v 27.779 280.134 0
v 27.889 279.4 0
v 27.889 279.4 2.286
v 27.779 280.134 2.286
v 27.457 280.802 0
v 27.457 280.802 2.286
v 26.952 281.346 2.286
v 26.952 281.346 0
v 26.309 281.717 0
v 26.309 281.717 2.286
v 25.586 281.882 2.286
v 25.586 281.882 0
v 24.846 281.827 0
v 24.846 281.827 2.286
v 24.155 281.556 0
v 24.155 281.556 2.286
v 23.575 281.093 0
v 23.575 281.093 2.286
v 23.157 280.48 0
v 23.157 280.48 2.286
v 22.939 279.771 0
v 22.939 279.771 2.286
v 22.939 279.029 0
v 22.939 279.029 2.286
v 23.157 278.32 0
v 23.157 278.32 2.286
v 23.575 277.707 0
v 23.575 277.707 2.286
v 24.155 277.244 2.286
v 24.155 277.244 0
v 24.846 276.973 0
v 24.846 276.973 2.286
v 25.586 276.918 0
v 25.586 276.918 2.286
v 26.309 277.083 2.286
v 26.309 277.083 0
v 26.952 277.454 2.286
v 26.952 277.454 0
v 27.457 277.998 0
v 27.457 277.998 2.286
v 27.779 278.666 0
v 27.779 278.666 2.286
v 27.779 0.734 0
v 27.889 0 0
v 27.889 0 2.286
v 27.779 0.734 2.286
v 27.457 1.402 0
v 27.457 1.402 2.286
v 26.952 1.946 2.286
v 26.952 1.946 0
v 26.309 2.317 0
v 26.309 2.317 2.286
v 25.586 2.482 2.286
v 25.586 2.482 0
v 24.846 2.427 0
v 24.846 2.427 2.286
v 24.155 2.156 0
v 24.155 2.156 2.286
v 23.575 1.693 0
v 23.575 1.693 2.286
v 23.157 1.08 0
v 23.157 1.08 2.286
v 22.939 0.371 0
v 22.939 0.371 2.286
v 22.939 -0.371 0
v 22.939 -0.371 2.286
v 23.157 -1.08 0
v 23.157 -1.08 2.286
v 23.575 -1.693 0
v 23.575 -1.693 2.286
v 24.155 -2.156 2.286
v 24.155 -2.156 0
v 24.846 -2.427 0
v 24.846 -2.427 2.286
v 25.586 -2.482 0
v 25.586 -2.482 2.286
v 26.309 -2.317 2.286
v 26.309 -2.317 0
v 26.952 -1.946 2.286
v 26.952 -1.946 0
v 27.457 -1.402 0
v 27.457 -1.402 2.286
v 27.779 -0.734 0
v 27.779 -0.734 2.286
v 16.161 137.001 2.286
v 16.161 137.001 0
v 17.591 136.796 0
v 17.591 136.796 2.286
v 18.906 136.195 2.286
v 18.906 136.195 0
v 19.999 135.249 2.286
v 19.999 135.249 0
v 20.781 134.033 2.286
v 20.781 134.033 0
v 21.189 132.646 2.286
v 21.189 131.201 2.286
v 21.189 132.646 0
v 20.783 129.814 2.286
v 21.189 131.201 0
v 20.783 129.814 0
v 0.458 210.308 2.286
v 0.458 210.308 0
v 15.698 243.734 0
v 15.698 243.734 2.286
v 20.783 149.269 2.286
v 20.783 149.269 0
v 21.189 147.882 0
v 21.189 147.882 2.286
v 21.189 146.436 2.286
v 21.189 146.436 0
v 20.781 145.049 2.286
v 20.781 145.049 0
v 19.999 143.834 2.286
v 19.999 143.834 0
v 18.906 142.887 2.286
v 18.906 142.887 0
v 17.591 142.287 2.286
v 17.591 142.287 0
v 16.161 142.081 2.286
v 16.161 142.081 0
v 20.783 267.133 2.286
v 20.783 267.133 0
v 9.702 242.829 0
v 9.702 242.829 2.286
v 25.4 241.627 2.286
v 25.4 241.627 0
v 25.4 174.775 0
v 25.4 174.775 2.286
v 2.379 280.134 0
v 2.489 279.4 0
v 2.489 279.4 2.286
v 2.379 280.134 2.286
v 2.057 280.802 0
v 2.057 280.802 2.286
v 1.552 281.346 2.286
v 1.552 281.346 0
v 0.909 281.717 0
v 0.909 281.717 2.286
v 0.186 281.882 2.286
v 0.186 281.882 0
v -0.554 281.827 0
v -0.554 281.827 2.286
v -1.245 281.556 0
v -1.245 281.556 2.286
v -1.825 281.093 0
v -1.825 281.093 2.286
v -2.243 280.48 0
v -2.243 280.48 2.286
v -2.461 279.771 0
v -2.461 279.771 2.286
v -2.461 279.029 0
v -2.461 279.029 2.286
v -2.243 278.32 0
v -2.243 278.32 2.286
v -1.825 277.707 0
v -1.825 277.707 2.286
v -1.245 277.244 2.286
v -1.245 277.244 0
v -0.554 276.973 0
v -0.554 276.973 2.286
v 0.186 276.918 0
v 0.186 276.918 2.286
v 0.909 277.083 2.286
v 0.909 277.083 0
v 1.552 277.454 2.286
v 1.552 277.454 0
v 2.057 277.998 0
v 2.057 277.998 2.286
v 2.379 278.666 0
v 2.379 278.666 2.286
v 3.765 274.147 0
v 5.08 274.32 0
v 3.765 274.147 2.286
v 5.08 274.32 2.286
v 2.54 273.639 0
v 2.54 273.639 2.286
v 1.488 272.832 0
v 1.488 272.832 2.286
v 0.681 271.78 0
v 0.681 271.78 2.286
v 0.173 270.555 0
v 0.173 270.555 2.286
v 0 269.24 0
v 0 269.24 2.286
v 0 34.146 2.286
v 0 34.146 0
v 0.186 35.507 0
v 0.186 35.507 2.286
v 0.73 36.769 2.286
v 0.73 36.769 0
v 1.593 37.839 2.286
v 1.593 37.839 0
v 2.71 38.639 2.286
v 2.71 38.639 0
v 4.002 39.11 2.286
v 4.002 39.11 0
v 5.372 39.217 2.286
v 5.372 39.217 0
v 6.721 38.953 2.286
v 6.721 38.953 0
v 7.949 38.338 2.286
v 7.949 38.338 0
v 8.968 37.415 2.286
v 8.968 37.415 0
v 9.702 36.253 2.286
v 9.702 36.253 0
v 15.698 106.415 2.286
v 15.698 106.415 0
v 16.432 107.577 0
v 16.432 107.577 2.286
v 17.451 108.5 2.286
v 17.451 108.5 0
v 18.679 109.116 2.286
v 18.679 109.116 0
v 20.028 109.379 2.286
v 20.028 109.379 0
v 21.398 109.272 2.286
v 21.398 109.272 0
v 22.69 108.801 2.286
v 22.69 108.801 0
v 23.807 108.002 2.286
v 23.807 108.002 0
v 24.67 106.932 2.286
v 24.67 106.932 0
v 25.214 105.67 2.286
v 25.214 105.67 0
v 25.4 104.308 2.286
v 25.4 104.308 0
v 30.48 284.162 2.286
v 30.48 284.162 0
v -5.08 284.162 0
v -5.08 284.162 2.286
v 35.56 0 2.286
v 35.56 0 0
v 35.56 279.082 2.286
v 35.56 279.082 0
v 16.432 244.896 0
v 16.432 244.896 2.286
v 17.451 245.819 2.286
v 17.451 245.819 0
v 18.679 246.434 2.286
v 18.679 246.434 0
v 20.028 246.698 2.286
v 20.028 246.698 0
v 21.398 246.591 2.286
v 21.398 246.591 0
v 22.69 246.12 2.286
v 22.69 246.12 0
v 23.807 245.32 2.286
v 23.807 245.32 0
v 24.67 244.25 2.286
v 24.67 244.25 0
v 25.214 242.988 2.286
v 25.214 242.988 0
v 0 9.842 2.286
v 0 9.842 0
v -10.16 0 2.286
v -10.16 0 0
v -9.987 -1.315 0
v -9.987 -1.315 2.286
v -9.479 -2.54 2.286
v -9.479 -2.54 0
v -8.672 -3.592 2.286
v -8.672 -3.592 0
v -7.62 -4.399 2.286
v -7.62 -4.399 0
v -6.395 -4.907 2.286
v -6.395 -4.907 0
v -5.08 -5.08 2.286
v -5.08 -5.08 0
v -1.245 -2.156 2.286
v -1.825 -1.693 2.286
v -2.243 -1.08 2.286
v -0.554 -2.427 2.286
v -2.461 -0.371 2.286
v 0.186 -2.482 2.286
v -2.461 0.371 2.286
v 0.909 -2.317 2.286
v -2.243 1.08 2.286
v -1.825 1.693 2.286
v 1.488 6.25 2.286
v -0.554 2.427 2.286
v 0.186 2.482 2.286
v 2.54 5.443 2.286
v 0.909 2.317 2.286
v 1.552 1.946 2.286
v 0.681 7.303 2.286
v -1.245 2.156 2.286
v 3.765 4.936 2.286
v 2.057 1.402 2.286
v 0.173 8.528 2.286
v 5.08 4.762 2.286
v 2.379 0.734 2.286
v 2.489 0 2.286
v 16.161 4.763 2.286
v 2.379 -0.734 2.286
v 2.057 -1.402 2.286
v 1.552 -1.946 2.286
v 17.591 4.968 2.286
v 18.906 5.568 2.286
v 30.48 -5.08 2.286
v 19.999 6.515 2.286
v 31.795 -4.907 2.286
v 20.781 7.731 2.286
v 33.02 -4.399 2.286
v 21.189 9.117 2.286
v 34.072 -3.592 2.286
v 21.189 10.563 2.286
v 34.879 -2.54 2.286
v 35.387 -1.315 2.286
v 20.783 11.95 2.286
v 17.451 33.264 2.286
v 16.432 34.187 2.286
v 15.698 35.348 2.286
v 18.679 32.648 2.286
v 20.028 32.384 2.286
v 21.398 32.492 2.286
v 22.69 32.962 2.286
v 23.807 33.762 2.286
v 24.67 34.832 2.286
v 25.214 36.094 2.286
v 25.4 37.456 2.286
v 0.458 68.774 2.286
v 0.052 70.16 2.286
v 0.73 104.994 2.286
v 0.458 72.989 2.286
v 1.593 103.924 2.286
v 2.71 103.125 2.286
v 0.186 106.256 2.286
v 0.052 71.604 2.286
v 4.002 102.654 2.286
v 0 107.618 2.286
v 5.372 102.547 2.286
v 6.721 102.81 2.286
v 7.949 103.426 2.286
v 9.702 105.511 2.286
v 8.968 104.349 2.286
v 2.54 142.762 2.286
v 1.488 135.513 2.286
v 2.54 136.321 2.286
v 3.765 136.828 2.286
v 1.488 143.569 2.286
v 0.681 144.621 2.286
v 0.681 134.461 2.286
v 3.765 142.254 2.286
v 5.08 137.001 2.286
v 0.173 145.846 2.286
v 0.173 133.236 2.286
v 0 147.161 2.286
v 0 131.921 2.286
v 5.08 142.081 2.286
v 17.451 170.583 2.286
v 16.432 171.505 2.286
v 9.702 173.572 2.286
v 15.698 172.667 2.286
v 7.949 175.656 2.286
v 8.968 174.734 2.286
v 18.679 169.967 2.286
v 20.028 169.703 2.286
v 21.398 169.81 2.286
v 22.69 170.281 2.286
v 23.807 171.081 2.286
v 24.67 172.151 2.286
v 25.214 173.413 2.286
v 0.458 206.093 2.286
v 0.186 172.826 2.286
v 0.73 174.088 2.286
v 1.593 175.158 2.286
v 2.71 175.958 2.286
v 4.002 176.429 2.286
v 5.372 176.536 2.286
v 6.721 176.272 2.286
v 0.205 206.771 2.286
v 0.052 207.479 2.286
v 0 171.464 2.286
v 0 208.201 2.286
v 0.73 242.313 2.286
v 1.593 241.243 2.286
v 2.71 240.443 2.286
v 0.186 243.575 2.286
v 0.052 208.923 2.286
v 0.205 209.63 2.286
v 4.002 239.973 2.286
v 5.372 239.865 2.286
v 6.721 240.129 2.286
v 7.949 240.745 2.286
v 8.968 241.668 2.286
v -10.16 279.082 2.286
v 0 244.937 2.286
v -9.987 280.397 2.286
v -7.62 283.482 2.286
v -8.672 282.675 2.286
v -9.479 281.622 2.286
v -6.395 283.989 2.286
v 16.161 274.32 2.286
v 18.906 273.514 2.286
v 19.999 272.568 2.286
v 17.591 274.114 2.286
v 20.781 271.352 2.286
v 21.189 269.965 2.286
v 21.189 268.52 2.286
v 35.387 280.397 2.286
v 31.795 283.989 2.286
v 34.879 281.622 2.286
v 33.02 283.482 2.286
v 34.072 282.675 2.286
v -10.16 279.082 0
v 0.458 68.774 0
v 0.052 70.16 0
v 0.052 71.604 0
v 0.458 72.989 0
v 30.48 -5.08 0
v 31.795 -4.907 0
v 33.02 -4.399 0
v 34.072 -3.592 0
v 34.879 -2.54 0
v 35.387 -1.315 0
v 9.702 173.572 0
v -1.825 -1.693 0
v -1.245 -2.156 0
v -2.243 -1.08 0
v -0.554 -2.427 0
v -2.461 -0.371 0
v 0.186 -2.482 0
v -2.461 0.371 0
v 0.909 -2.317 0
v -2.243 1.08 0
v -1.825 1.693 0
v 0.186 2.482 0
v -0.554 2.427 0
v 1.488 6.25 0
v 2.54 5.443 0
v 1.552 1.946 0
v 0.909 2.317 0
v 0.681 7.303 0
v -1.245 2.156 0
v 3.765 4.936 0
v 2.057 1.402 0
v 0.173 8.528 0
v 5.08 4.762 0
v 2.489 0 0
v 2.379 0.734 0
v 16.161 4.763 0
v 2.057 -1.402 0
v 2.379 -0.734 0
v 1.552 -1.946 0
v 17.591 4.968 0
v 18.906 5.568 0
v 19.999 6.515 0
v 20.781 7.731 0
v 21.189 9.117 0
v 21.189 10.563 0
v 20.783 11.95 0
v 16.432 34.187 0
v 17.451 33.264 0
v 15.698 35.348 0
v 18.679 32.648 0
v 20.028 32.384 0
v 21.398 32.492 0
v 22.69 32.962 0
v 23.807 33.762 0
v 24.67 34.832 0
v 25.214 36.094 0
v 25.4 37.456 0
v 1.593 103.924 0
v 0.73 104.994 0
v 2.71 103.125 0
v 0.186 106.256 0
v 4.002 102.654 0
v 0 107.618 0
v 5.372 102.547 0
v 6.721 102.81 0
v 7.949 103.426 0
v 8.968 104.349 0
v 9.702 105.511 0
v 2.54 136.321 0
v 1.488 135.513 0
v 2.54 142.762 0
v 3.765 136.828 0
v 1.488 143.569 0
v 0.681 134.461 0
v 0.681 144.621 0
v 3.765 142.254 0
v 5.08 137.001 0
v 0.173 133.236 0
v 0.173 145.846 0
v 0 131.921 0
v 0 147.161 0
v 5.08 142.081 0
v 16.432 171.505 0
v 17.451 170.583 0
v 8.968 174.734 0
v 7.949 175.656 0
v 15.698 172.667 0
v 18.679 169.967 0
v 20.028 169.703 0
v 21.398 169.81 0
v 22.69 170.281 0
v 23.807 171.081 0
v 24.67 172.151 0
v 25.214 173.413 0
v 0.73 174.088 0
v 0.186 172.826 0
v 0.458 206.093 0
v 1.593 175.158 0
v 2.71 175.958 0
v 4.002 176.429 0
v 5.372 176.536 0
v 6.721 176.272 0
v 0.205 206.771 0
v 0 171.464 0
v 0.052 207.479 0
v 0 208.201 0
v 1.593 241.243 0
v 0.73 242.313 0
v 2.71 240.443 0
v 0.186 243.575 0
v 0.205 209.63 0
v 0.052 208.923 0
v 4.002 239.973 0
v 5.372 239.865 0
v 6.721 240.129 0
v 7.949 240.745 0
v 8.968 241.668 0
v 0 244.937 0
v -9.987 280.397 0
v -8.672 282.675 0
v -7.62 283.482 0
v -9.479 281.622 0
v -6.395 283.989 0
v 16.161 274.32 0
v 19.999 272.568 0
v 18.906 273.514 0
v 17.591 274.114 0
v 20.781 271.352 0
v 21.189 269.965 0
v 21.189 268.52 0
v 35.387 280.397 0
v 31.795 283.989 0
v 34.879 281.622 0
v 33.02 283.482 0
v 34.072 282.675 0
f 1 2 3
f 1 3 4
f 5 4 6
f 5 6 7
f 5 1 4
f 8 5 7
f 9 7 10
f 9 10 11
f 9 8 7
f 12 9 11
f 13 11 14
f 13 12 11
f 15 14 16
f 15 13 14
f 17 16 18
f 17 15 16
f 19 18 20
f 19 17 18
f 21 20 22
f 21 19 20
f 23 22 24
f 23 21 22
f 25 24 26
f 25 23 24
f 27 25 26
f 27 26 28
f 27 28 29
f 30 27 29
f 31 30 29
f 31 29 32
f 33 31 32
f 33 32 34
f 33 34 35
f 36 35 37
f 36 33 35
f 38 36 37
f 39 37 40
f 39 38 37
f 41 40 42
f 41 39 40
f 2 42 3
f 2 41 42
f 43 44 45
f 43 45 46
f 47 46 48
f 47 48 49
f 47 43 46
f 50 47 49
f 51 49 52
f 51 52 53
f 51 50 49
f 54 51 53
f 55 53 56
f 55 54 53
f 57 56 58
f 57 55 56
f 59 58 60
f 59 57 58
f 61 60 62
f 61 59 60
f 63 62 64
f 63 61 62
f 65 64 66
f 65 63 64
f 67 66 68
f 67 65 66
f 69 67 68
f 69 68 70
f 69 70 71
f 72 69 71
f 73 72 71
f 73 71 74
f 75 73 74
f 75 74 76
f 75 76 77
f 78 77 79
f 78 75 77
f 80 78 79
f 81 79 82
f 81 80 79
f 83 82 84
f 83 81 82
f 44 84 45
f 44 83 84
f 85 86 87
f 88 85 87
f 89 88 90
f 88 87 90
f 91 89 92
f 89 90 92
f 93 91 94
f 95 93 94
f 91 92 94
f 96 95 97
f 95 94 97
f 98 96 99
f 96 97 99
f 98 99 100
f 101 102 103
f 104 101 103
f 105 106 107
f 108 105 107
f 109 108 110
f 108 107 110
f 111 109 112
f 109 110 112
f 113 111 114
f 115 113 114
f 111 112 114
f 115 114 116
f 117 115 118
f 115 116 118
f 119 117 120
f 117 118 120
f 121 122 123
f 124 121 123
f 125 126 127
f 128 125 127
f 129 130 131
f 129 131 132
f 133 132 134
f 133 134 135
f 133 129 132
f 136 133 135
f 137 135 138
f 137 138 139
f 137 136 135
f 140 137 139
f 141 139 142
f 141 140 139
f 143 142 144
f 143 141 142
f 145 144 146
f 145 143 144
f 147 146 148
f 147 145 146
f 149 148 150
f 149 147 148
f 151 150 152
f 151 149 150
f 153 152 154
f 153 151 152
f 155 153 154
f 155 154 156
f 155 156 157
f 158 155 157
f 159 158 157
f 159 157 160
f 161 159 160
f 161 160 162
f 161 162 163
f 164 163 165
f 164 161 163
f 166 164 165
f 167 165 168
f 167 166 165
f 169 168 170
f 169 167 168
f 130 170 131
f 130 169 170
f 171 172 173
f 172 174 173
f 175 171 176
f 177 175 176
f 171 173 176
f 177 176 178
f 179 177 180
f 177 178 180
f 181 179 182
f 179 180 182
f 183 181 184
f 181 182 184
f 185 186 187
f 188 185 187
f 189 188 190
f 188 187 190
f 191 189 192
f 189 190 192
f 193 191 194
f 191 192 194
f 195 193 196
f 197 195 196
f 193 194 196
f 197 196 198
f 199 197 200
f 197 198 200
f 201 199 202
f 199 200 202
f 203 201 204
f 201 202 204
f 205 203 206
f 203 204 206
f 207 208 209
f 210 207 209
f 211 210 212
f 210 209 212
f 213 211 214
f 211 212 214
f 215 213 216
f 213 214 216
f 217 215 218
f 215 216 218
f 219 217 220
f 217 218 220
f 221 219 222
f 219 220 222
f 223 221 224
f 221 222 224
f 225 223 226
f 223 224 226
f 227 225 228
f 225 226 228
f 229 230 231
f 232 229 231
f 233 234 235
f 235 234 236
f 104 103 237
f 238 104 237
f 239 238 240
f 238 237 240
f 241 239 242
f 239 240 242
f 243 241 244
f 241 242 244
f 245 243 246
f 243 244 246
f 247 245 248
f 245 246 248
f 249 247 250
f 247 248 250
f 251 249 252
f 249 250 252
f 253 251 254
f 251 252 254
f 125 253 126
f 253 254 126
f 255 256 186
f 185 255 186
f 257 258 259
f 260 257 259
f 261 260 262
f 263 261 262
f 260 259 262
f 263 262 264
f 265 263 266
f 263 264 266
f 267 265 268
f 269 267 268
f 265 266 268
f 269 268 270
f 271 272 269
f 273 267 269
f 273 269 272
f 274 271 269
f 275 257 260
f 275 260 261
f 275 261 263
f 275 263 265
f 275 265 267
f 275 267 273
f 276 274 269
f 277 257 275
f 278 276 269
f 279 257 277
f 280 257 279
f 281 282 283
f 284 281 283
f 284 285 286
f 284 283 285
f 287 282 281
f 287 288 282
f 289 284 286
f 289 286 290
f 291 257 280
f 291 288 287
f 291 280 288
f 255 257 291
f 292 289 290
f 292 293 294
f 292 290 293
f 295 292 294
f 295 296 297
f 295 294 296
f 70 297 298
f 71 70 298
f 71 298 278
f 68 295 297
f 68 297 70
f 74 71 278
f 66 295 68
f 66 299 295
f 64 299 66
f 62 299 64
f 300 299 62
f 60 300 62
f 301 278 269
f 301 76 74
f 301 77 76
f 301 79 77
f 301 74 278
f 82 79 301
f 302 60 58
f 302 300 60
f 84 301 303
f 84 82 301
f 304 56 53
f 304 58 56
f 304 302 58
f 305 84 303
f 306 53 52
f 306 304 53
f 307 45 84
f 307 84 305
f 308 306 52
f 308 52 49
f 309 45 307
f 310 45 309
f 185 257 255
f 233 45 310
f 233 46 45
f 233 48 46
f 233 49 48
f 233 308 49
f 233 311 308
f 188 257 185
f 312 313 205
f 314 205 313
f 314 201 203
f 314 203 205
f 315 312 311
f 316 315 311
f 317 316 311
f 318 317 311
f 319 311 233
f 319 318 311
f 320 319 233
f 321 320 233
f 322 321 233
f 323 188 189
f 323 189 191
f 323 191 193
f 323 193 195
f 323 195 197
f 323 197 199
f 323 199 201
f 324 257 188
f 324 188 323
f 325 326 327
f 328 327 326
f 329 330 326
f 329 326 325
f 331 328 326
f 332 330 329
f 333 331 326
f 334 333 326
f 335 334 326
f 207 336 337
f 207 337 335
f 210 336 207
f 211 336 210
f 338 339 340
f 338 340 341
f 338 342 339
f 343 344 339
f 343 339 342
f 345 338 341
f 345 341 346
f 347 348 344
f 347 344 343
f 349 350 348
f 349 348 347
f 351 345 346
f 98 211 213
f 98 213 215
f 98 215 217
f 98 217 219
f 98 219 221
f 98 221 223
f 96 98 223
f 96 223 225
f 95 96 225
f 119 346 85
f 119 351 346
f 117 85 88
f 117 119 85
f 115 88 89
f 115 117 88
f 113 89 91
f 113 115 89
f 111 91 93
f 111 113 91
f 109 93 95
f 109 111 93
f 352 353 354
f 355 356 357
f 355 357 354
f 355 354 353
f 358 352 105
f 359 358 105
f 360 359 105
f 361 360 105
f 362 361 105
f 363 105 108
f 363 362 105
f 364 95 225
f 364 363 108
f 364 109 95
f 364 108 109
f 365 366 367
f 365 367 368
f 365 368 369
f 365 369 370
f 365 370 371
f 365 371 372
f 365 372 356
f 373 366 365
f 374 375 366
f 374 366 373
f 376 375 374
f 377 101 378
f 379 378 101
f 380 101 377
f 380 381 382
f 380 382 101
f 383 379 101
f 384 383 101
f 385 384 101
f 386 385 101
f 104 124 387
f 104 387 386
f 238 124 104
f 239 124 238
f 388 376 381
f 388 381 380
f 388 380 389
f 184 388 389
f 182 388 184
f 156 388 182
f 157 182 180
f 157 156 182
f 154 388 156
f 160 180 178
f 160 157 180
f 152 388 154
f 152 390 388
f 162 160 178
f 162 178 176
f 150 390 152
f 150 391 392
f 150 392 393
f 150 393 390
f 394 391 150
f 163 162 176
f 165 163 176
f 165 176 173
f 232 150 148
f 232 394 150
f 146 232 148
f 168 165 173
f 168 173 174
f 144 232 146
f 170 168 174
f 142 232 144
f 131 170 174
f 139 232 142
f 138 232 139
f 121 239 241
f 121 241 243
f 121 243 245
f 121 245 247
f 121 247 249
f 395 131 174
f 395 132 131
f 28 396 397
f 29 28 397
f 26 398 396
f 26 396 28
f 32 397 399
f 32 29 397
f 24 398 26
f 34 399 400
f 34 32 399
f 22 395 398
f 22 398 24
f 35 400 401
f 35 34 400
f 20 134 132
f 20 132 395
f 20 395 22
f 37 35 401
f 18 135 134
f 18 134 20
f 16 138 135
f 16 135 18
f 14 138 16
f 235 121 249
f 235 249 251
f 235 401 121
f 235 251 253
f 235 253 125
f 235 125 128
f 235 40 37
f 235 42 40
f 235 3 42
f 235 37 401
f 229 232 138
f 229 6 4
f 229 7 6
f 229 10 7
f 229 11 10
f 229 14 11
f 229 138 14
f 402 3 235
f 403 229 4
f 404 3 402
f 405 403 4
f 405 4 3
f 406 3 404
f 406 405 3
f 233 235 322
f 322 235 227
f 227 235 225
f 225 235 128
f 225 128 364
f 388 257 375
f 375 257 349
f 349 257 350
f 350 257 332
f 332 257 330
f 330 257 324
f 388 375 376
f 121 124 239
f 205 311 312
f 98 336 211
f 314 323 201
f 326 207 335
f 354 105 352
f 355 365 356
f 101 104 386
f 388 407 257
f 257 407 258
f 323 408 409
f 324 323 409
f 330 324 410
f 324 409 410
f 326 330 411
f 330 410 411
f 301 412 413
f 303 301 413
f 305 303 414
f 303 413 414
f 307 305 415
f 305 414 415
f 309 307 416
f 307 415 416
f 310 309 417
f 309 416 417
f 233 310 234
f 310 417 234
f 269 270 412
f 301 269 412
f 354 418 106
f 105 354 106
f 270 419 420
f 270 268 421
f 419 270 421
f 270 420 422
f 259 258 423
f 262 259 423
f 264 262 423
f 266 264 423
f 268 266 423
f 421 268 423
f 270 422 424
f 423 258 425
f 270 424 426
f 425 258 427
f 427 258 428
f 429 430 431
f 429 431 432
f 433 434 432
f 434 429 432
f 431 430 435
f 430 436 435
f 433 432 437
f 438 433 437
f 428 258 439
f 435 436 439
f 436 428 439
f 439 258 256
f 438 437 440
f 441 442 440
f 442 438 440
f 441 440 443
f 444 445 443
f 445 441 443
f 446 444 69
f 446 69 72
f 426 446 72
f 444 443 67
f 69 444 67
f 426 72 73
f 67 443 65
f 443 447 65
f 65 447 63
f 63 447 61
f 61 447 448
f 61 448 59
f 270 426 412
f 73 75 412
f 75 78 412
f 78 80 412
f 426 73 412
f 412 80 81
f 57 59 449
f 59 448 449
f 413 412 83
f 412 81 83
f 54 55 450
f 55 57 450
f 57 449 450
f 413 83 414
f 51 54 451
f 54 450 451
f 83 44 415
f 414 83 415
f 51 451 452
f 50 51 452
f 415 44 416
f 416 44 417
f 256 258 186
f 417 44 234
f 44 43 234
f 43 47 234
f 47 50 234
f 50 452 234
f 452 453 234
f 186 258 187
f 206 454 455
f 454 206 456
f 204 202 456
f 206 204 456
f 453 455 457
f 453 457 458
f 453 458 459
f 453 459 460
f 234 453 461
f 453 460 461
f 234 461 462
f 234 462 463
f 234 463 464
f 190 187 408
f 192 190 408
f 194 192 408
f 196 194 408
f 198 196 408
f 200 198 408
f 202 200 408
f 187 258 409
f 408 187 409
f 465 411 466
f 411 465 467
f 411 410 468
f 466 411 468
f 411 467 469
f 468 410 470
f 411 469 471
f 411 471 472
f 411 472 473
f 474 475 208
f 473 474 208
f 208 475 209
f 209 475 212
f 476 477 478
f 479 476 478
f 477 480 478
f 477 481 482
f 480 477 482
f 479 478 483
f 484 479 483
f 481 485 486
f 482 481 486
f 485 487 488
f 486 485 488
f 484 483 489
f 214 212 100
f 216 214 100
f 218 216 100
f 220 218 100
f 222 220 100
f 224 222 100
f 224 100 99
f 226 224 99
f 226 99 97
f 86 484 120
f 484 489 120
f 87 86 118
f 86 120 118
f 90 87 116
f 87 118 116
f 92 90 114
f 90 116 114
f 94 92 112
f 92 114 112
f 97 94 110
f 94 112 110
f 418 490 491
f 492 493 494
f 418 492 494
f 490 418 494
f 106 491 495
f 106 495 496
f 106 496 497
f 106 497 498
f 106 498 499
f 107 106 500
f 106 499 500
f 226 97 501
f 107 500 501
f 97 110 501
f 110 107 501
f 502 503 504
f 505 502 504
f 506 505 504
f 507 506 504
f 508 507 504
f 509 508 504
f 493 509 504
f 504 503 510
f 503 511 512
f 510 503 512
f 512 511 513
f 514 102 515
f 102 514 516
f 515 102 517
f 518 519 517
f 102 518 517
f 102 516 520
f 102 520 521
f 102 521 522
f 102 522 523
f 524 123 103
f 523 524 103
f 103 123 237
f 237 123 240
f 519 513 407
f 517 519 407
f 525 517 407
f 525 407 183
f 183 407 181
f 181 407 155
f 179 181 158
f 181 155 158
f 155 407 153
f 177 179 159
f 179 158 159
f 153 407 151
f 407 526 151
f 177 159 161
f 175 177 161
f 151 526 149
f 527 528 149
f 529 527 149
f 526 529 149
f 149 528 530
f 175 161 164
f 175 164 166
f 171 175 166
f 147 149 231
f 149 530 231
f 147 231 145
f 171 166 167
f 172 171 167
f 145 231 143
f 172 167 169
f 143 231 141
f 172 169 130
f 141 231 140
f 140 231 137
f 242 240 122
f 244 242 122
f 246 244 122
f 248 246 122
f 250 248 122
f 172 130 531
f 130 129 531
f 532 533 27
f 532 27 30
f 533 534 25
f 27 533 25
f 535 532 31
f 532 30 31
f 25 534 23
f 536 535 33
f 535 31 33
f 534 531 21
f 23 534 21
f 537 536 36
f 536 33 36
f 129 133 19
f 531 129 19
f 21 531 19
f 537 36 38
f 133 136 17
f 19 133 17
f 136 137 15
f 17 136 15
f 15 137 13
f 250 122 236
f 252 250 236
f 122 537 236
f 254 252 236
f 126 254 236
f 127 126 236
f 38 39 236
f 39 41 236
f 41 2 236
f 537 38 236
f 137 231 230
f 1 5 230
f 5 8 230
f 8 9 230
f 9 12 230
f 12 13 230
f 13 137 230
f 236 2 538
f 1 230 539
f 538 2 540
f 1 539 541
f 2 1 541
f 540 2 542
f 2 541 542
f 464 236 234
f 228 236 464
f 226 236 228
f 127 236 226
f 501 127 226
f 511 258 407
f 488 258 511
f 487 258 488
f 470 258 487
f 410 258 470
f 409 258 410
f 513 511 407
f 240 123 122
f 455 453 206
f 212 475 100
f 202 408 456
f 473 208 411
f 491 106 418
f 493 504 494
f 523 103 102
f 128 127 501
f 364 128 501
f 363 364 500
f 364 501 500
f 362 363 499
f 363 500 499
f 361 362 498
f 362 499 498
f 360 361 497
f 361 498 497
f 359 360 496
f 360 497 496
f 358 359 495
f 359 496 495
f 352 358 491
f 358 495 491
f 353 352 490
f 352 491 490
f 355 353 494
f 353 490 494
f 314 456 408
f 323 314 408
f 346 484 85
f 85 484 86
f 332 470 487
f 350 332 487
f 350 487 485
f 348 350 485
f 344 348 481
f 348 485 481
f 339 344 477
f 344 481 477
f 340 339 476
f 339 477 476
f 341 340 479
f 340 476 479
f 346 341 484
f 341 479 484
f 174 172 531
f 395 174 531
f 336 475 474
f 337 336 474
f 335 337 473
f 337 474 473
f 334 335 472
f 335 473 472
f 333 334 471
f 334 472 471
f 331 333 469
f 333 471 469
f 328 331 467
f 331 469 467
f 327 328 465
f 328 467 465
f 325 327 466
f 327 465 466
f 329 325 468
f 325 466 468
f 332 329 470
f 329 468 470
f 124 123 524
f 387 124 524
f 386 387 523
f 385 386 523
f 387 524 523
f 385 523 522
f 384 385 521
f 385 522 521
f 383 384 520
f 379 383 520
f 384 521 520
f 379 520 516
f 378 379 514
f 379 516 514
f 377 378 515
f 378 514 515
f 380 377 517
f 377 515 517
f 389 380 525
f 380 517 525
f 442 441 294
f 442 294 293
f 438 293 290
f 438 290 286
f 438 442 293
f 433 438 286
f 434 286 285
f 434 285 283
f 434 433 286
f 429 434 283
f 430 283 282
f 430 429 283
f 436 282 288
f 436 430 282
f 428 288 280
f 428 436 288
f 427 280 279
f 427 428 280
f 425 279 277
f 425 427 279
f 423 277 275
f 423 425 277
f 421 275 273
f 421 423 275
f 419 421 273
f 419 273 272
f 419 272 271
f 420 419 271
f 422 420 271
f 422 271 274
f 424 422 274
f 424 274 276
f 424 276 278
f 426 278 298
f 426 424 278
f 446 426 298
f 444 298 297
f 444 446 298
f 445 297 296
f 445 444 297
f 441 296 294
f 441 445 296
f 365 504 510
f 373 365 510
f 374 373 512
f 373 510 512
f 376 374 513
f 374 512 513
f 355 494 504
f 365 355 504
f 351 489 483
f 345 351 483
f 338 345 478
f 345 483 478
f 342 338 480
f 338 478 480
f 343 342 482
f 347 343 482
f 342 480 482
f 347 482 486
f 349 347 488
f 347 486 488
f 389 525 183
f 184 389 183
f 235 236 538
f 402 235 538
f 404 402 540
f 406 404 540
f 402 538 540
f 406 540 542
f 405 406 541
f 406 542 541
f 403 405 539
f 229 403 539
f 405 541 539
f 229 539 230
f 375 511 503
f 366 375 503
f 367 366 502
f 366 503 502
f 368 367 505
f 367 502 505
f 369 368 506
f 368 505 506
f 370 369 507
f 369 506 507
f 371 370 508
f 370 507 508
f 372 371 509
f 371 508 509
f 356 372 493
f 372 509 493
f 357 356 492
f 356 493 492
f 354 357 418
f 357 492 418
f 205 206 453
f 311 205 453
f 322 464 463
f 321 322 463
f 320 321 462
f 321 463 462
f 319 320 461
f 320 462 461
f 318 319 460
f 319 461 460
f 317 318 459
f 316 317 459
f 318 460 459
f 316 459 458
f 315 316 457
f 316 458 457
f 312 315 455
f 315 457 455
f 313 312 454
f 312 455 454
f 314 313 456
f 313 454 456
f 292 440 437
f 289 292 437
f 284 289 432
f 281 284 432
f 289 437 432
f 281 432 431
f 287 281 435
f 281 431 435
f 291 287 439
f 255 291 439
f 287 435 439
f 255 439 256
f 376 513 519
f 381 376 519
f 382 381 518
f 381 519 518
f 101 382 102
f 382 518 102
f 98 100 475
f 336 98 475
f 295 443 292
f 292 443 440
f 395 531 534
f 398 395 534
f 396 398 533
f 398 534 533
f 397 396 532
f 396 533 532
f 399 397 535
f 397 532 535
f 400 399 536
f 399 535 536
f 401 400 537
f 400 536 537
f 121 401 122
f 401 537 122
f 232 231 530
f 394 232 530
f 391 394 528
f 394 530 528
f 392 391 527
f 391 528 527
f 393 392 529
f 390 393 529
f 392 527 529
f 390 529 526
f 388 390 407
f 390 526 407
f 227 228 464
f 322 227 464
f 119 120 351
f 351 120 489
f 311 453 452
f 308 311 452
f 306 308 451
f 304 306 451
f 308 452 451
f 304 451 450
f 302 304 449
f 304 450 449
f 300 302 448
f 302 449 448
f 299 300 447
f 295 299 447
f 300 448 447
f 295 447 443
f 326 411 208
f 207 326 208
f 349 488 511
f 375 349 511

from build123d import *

# Parameters (mm, degrees)
SKETCH1_R           = 2.4892
BOSS_EXTRUDE1_DEPTH = 2.286
FILLET1_R           = 5.08


with BuildPart() as part:
    # Sketch1 → Boss-Extrude1 (new body)
    with BuildSketch(Plane.XY):
        with BuildLine():
            ThreePointArc((-10.16, 0), (-8.672102448, -3.592102448), (-5.08, -5.08))
            Line((-5.08, -5.08), (30.48, -5.08))
            ThreePointArc((30.48, -5.08), (34.072102448, -3.592102448), (35.56, 0))
            Line((35.56, 0), (35.56, 279.0825))
            ThreePointArc((35.56, 279.0825), (34.072102448, 282.674602448), (30.48, 284.1625))
            Line((30.48, 284.1625), (-5.08, 284.1625))
            ThreePointArc((-5.08, 284.1625), (-8.672102448, 282.674602448), (-10.16, 279.0825))
            Line((-10.16, 279.0825), (-10.16, 0))
        make_face()
        Circle(SKETCH1_R, mode=Mode.SUBTRACT)
        with BuildLine():
            Line((9.702242909, 36.253036461), (20.782825554, 11.949932204))
            ThreePointArc((20.782825554, 11.949932204), (20.433295811, 7.094715037), (16.160582646, 4.7625))
            Line((16.160582646, 4.7625), (5.08, 4.7625))
            ThreePointArc((5.08, 4.7625), (1.487897552, 6.250397552), (0, 9.8425))
            Line((0, 9.8425), (0, 34.145604258))
            ThreePointArc((0, 34.145604258), (4.001712927, 39.109846092), (9.702242909, 36.253036461))
        make_face(mode=Mode.SUBTRACT)
        with BuildLine():
            Line((0, 107.618145742), (0, 131.92125))
            ThreePointArc((0, 131.92125), (1.487897552, 135.513352448), (5.08, 137.00125))
            Line((5.08, 137.00125), (16.160582646, 137.00125))
            ThreePointArc((16.160582646, 137.00125), (20.433295811, 134.669034963), (20.782825554, 129.813817796))
            Line((20.782825554, 129.813817796), (9.702242909, 105.510713539))
            ThreePointArc((9.702242909, 105.510713539), (4.001712927, 102.653903908), (0, 107.618145742))
        make_face(mode=Mode.SUBTRACT)
        with Locations((25.4, 0)):
            Circle(SKETCH1_R, mode=Mode.SUBTRACT)
        with BuildLine():
            Line((15.697757091, 35.348465054), (0.457757091, 68.774442796))
            ThreePointArc((0.457757091, 68.774442796), (0, 70.881875), (0.457757091, 72.989307204))
            Line((0.457757091, 72.989307204), (15.697757091, 106.415284946))
            ThreePointArc((15.697757091, 106.415284946), (21.398287073, 109.272094577), (25.4, 104.307852743))
            Line((25.4, 104.307852743), (25.4, 37.455897257))
            ThreePointArc((25.4, 37.455897257), (21.398287073, 32.491655423), (15.697757091, 35.348465054))
        make_face(mode=Mode.SUBTRACT)
        with BuildLine():
            Line((0, 147.16125), (0, 171.464354258))
            ThreePointArc((0, 171.464354258), (4.001712927, 176.428596092), (9.702242909, 173.571786461))
            Line((9.702242909, 173.571786461), (20.782825554, 149.268682204))
            ThreePointArc((20.782825554, 149.268682204), (20.433295811, 144.413465037), (16.160582646, 142.08125))
            Line((16.160582646, 142.08125), (5.08, 142.08125))
            ThreePointArc((5.08, 142.08125), (1.487897552, 143.569147552), (0, 147.16125))
        make_face(mode=Mode.SUBTRACT)
        with BuildLine():
            ThreePointArc((0.457757091, 206.093192796), (0.115758165, 207.122337929), (0, 208.200625004))
            ThreePointArc((0, 208.200625004), (0.115758166, 209.278912075), (0.457757091, 210.308057204))
            Line((0.457757091, 210.308057204), (15.697757091, 243.734034946))
            ThreePointArc((15.697757091, 243.734034946), (21.398287073, 246.590844577), (25.4, 241.626602743))
            Line((25.4, 241.626602743), (25.4, 174.774647257))
            ThreePointArc((25.4, 174.774647257), (21.398287073, 169.810405423), (15.697757091, 172.667215054))
            Line((15.697757091, 172.667215054), (0.457757091, 206.093192796))
        make_face(mode=Mode.SUBTRACT)
        with Locations((0, 279.4)):
            Circle(SKETCH1_R, mode=Mode.SUBTRACT)
        with BuildLine():
            Line((5.08, 274.32), (16.160582646, 274.32))
            ThreePointArc((16.160582646, 274.32), (20.433295811, 271.987784963), (20.782825554, 267.132567796))
            Line((20.782825554, 267.132567796), (9.702242909, 242.829463539))
            ThreePointArc((9.702242909, 242.829463539), (4.001712927, 239.972653908), (0, 244.936895742))
            Line((0, 244.936895742), (0, 269.24))
            Line((0, 269.24), (0, 274.32))
            Line((0, 274.32), (5.08, 274.32))
        make_face(mode=Mode.SUBTRACT)
        with Locations((25.4, 279.4)):
            Circle(SKETCH1_R, mode=Mode.SUBTRACT)
    extrude(amount=BOSS_EXTRUDE1_DEPTH)

    # Fillet1
    fillet1_edges = [part.edges().sort_by_distance(p)[0] for p in [
        (0, 274.32, 1.143),
    ]]
    fillet(fillet1_edges, radius=FILLET1_R)


solid = part.part
